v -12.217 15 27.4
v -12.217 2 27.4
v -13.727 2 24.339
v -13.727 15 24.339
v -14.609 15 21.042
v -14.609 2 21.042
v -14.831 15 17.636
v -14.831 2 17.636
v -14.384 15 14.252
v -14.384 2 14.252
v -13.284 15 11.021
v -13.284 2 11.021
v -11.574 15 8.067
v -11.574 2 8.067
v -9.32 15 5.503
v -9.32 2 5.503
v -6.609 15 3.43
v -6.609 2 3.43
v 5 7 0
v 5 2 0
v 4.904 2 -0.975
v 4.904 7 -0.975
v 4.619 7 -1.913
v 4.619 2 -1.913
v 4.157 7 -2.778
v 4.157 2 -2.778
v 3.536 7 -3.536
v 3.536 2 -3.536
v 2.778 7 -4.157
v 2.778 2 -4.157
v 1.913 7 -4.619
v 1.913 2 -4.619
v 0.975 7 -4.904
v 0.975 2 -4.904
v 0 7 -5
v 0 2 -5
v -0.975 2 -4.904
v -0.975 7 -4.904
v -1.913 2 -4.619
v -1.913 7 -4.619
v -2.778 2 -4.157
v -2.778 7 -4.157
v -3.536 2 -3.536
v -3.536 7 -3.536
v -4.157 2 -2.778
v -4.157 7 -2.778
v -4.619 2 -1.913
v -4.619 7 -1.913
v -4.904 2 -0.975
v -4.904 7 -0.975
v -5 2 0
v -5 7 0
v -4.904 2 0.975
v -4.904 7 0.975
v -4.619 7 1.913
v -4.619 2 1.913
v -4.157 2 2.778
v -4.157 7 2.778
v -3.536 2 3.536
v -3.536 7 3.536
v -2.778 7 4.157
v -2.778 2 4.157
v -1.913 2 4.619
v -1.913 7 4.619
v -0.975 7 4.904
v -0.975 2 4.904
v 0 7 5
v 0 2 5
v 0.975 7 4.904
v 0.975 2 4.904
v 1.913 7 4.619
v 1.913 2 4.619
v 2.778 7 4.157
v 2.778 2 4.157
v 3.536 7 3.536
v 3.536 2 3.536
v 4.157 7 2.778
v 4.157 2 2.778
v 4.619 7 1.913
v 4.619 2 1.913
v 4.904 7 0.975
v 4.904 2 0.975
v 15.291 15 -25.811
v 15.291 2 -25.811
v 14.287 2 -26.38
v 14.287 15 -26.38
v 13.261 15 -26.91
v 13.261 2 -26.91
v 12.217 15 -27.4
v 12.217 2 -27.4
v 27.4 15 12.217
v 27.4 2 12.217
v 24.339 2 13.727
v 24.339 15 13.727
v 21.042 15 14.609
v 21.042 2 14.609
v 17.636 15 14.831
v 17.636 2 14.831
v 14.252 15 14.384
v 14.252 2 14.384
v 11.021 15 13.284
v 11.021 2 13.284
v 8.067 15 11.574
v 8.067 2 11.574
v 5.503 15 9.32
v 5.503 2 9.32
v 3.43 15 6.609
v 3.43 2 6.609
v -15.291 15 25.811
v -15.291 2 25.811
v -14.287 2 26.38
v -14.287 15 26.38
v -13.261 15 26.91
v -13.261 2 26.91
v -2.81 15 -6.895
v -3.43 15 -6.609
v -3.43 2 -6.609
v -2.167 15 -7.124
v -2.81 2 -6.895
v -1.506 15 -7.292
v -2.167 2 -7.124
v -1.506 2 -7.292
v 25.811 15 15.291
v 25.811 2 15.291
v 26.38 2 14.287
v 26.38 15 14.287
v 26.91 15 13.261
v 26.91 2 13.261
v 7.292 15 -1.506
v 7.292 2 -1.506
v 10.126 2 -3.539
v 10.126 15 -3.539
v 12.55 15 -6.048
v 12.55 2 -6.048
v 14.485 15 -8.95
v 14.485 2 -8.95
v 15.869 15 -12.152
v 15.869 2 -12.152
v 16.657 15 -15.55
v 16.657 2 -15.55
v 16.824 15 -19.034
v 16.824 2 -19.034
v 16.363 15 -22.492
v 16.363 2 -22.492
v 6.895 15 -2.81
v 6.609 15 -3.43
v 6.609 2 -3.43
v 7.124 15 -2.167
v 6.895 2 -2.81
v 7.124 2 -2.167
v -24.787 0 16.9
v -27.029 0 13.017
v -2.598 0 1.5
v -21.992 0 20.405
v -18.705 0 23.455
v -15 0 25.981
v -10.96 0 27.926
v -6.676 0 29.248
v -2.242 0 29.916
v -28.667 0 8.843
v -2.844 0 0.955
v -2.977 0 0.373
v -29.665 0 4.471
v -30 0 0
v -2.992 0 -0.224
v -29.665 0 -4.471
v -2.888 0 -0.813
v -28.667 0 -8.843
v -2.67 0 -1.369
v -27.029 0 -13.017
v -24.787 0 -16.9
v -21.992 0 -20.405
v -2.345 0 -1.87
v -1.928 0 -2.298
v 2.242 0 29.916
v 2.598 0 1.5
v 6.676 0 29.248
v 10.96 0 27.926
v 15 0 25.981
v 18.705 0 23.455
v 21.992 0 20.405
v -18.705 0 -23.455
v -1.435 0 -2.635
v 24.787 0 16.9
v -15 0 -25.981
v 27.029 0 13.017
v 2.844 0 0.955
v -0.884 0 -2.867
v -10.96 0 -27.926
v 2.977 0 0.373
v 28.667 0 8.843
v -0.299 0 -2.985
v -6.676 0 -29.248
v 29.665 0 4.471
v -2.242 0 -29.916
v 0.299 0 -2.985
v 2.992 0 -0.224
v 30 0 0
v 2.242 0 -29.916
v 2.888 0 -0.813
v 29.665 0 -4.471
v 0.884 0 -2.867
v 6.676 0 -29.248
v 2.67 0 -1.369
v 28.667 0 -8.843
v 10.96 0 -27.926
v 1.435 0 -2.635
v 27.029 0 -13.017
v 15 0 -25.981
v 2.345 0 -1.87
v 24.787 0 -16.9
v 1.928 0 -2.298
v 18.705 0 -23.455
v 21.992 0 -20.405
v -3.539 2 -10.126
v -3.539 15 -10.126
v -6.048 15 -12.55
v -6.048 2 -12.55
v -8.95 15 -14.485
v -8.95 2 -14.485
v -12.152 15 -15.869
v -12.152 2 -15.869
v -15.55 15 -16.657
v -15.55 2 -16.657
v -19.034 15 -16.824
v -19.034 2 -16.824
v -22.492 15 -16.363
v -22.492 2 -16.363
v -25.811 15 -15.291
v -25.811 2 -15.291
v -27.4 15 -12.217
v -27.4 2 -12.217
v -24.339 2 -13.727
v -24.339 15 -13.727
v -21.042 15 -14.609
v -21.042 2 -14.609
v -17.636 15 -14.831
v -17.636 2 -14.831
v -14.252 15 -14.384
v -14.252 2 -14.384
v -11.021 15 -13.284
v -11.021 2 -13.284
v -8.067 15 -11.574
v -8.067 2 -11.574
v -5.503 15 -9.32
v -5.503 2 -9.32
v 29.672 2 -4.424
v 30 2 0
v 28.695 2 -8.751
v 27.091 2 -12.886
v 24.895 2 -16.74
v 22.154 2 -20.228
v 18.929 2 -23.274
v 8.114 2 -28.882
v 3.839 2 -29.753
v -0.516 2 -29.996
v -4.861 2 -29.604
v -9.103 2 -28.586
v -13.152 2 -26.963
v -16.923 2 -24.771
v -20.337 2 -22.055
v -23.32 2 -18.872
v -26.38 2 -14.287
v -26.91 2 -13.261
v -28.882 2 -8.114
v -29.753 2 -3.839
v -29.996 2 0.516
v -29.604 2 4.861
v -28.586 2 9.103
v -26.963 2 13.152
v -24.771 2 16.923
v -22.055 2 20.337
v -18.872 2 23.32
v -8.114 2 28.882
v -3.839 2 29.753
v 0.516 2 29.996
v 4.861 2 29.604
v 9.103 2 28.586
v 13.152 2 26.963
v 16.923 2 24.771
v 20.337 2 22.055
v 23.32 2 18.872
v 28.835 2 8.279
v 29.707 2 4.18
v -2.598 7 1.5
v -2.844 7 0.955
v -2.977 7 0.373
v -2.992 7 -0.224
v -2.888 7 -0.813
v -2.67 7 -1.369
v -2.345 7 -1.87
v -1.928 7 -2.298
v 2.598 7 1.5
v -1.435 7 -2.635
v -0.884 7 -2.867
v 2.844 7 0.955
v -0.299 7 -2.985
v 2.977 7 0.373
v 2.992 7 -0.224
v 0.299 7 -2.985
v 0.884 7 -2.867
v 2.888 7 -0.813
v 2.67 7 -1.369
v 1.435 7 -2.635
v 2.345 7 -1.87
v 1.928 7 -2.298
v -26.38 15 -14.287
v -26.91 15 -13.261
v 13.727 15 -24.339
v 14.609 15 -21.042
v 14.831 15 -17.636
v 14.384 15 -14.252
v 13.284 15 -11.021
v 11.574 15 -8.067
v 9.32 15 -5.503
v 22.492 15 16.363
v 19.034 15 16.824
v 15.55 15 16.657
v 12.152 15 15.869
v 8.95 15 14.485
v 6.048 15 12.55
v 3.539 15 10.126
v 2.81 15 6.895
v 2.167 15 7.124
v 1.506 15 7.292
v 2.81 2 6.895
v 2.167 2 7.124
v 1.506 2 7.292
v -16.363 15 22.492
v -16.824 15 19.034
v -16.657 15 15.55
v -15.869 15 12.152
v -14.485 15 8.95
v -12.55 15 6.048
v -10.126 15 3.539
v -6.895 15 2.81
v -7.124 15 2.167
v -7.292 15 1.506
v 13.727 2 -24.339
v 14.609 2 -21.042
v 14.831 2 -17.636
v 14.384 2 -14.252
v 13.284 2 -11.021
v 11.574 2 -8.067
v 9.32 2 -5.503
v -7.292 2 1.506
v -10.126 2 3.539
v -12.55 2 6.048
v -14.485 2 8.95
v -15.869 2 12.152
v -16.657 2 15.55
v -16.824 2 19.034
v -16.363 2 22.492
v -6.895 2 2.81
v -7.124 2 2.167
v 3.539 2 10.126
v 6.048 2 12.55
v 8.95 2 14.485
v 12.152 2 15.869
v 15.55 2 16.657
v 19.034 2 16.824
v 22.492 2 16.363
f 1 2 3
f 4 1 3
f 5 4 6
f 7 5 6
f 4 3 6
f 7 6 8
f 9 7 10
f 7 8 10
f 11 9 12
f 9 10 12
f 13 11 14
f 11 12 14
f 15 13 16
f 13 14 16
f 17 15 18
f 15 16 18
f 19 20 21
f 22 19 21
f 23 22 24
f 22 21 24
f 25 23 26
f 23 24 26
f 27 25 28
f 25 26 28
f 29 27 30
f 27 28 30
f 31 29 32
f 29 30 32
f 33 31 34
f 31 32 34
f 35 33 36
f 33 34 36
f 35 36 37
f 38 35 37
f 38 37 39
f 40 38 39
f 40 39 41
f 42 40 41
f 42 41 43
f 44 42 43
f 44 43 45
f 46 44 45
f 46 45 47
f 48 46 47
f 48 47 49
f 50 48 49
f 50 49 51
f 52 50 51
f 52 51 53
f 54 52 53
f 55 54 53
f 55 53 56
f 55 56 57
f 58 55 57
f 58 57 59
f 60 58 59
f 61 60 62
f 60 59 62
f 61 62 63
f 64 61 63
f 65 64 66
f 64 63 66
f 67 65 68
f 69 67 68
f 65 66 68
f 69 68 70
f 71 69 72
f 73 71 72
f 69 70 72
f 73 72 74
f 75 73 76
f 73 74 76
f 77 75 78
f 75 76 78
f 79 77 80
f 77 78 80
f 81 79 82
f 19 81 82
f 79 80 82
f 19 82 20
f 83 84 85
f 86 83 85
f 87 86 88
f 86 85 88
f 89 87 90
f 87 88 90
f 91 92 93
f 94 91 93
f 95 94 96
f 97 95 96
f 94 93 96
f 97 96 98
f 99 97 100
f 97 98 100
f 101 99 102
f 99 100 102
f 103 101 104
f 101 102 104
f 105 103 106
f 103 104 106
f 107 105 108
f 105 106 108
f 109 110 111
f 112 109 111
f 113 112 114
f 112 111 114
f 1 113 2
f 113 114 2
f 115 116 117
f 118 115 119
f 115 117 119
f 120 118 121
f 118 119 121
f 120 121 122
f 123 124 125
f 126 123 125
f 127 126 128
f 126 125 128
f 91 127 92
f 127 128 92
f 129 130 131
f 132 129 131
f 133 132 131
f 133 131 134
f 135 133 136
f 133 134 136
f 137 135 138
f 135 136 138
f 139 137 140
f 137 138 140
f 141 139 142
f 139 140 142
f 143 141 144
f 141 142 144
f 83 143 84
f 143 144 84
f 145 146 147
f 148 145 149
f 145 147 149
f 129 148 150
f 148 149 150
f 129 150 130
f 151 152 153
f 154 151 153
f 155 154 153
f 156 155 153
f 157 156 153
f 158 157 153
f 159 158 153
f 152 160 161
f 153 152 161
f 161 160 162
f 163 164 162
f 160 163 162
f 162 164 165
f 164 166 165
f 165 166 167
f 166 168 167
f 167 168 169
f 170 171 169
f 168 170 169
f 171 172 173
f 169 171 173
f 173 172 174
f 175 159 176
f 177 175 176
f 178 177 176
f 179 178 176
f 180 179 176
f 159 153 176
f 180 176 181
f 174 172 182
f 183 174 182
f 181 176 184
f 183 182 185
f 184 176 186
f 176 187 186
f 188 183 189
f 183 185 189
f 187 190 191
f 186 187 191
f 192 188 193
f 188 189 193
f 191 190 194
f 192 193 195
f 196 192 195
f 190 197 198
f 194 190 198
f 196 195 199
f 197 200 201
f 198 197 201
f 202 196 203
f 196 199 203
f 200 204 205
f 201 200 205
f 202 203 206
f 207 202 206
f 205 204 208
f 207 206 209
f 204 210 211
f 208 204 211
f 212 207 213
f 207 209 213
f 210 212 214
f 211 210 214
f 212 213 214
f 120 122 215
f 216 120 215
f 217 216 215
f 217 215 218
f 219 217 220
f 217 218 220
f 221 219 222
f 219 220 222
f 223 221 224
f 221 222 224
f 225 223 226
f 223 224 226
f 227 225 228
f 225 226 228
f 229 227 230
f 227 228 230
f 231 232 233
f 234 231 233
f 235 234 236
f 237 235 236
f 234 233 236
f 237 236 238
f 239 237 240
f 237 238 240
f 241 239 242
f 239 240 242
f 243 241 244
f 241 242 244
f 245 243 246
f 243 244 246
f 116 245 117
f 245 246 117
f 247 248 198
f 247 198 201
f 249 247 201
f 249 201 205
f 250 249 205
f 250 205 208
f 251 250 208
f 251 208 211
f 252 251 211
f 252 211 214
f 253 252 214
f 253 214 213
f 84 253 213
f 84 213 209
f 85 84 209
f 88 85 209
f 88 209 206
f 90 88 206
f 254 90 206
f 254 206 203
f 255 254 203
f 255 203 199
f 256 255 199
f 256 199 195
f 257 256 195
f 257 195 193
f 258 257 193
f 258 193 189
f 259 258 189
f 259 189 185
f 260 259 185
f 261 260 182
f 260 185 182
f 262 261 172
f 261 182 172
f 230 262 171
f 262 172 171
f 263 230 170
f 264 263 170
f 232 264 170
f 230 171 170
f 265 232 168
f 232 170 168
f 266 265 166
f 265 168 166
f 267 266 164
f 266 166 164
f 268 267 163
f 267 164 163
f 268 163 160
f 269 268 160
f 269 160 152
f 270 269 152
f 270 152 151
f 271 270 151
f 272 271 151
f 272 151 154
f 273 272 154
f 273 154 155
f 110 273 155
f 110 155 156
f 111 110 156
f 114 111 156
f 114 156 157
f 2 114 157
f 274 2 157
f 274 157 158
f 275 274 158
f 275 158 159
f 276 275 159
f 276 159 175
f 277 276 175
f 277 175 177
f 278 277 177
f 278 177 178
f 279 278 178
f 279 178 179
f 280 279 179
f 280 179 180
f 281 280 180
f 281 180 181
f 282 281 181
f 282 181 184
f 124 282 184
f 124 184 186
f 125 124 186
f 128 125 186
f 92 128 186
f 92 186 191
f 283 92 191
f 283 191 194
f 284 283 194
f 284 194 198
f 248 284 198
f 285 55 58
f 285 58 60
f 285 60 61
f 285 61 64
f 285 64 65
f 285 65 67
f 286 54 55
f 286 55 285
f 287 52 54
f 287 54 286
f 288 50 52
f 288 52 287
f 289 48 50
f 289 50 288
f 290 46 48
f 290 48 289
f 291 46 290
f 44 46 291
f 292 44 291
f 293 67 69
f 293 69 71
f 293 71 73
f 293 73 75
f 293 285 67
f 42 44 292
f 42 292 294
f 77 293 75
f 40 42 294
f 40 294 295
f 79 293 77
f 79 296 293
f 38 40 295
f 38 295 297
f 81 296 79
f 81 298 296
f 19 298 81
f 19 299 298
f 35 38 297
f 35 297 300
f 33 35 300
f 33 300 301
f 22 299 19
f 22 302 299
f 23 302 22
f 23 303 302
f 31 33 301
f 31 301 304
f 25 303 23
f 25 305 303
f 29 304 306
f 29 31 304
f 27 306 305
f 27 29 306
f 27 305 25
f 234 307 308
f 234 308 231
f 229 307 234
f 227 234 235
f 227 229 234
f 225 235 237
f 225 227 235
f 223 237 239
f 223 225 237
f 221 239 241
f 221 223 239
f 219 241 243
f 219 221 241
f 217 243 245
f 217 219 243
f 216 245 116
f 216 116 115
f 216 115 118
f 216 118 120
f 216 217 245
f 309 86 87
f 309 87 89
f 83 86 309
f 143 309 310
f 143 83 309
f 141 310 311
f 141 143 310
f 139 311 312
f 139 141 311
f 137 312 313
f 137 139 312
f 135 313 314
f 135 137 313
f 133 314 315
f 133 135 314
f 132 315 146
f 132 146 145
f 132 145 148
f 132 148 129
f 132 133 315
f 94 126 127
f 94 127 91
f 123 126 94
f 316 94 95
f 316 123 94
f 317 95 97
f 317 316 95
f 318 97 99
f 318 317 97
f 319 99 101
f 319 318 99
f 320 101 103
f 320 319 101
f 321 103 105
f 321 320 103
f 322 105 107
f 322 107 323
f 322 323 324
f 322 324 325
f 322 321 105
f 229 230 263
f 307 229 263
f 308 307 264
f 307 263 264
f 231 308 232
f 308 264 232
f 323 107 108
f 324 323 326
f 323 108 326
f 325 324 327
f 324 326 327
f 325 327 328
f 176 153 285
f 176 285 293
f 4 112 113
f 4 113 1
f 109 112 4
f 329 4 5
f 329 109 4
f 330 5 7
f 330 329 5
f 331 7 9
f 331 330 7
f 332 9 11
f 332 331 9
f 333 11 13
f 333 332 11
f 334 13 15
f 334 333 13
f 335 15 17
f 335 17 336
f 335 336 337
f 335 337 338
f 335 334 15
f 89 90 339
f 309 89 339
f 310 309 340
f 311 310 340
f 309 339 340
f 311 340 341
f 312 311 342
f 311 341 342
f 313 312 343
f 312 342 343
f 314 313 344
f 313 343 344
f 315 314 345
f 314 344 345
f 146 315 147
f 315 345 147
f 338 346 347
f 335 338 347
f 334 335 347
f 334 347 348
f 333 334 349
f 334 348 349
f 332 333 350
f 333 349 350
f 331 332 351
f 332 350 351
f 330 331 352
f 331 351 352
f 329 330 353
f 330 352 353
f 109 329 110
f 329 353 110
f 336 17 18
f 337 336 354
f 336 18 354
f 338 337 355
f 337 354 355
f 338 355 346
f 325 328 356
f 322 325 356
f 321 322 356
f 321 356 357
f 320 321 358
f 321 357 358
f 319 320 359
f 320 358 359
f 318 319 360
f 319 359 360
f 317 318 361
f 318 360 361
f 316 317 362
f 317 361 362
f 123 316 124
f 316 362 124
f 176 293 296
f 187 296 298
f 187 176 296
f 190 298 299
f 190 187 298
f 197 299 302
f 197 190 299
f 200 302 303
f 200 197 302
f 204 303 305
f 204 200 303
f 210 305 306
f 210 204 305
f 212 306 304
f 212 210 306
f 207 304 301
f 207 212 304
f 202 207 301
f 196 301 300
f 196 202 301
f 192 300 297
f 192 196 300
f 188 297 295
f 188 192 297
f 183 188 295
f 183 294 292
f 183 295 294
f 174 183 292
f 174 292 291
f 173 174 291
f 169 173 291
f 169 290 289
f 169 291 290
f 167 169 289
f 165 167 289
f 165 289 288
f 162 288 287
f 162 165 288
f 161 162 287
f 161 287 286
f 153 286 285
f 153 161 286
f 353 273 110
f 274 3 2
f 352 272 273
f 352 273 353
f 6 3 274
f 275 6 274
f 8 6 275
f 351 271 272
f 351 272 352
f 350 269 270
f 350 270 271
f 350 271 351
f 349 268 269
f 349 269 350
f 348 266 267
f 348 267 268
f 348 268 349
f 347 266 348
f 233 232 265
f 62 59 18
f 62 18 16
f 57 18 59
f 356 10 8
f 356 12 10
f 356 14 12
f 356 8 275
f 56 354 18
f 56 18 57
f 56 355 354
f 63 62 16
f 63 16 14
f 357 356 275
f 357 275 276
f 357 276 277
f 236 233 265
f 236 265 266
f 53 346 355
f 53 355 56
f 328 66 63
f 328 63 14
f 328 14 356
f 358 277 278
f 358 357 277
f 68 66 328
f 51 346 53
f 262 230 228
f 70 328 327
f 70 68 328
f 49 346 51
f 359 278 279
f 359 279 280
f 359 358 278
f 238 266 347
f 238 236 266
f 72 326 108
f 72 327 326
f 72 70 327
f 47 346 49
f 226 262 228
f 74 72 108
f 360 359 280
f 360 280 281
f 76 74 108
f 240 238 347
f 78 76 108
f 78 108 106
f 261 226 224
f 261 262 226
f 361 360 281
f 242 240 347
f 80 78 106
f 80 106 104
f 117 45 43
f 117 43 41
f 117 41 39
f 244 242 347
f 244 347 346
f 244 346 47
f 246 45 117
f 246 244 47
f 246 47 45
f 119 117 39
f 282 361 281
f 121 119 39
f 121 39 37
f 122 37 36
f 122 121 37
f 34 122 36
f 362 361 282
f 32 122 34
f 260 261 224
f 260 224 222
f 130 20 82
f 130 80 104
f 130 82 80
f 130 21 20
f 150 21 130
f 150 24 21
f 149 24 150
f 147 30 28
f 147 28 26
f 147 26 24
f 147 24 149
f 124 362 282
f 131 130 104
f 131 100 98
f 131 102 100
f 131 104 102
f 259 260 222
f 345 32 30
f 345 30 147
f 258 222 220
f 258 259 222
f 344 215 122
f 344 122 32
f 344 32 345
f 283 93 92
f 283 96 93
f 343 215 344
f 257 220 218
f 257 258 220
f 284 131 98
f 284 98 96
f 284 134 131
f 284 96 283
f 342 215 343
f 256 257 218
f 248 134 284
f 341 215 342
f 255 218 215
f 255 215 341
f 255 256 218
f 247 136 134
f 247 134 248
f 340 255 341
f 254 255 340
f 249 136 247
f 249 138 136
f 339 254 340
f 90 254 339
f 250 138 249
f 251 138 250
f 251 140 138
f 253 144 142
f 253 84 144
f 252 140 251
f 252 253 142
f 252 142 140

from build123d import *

# Parameters (mm, degrees)
SKETCH1_R           = 30
BOSS_EXTRUDE1_DEPTH = 2
SKETCH2_R           = 5
BOSS_EXTRUDE2_DEPTH = 7
BOSS_EXTRUDE3_DEPTH = 13
CUT_EXTRUDE1_DEPTH  = 16
CIRPATTERN2_COUNT   = 4


with BuildPart() as part:
    # Sketch1 → Boss-Extrude1 (new body)
    with BuildSketch(Plane(origin=(0, 0, 0), x_dir=(1, 0, 0), z_dir=(0, 1, 0))):
        Circle(SKETCH1_R)
    extrude(amount=BOSS_EXTRUDE1_DEPTH)

    # Sketch2 → Boss-Extrude2 (add)
    with BuildSketch(Plane(origin=(0, 0, 0), x_dir=(1, 0, 0), z_dir=(0, 1, 0))):
        Circle(SKETCH2_R)
    extrude(amount=BOSS_EXTRUDE2_DEPTH)

    # Sketch3 → Boss-Extrude3 (add)
    with BuildSketch(Plane(origin=(0, 2, 0), x_dir=(1, 0, 0), z_dir=(0, 1, 0))):
        with BuildLine():
            ThreePointArc((-1.505806951, 7.292266896), (-12.151790035, 15.86929072), (-25.810761164, 15.290670625))
            ThreePointArc((-25.810761164, 15.290670625), (-26.649690738, 13.776573724), (-27.399897799, 12.216611666))
            ThreePointArc((-27.399897799, 12.216611666), (-14.251932533, 14.383859932), (-3.429686075, 6.60922571))
            ThreePointArc((-3.429686075, 6.60922571), (-2.491266579, 7.016993793), (-1.505806951, 7.292266896))
        make_face()
    boss_extrude3 = extrude(amount=BOSS_EXTRUDE3_DEPTH)

    # Sketch4 → Cut-Extrude1 (cut, through all)
    with BuildSketch(Plane(origin=(0, 0, 0), x_dir=(1, 0, 0), z_dir=(0, 1, 0))):
        with BuildLine():
            Line((-2.598076211, -1.5), (2.598076211, -1.5))
            ThreePointArc((2.598076211, -1.5), (0, 3), (-2.598076211, -1.5))
        make_face()
    extrude(amount=CUT_EXTRUDE1_DEPTH, mode=Mode.SUBTRACT)

    # CirPattern2: Boss-Extrude3 ×4 about axis
    cirpattern2_axis = Axis((0, 0, 0), (0, 1, 0))
    for i in range(1, CIRPATTERN2_COUNT):
        add(boss_extrude3.rotate(cirpattern2_axis, i * 360 / CIRPATTERN2_COUNT))


solid = part.part
